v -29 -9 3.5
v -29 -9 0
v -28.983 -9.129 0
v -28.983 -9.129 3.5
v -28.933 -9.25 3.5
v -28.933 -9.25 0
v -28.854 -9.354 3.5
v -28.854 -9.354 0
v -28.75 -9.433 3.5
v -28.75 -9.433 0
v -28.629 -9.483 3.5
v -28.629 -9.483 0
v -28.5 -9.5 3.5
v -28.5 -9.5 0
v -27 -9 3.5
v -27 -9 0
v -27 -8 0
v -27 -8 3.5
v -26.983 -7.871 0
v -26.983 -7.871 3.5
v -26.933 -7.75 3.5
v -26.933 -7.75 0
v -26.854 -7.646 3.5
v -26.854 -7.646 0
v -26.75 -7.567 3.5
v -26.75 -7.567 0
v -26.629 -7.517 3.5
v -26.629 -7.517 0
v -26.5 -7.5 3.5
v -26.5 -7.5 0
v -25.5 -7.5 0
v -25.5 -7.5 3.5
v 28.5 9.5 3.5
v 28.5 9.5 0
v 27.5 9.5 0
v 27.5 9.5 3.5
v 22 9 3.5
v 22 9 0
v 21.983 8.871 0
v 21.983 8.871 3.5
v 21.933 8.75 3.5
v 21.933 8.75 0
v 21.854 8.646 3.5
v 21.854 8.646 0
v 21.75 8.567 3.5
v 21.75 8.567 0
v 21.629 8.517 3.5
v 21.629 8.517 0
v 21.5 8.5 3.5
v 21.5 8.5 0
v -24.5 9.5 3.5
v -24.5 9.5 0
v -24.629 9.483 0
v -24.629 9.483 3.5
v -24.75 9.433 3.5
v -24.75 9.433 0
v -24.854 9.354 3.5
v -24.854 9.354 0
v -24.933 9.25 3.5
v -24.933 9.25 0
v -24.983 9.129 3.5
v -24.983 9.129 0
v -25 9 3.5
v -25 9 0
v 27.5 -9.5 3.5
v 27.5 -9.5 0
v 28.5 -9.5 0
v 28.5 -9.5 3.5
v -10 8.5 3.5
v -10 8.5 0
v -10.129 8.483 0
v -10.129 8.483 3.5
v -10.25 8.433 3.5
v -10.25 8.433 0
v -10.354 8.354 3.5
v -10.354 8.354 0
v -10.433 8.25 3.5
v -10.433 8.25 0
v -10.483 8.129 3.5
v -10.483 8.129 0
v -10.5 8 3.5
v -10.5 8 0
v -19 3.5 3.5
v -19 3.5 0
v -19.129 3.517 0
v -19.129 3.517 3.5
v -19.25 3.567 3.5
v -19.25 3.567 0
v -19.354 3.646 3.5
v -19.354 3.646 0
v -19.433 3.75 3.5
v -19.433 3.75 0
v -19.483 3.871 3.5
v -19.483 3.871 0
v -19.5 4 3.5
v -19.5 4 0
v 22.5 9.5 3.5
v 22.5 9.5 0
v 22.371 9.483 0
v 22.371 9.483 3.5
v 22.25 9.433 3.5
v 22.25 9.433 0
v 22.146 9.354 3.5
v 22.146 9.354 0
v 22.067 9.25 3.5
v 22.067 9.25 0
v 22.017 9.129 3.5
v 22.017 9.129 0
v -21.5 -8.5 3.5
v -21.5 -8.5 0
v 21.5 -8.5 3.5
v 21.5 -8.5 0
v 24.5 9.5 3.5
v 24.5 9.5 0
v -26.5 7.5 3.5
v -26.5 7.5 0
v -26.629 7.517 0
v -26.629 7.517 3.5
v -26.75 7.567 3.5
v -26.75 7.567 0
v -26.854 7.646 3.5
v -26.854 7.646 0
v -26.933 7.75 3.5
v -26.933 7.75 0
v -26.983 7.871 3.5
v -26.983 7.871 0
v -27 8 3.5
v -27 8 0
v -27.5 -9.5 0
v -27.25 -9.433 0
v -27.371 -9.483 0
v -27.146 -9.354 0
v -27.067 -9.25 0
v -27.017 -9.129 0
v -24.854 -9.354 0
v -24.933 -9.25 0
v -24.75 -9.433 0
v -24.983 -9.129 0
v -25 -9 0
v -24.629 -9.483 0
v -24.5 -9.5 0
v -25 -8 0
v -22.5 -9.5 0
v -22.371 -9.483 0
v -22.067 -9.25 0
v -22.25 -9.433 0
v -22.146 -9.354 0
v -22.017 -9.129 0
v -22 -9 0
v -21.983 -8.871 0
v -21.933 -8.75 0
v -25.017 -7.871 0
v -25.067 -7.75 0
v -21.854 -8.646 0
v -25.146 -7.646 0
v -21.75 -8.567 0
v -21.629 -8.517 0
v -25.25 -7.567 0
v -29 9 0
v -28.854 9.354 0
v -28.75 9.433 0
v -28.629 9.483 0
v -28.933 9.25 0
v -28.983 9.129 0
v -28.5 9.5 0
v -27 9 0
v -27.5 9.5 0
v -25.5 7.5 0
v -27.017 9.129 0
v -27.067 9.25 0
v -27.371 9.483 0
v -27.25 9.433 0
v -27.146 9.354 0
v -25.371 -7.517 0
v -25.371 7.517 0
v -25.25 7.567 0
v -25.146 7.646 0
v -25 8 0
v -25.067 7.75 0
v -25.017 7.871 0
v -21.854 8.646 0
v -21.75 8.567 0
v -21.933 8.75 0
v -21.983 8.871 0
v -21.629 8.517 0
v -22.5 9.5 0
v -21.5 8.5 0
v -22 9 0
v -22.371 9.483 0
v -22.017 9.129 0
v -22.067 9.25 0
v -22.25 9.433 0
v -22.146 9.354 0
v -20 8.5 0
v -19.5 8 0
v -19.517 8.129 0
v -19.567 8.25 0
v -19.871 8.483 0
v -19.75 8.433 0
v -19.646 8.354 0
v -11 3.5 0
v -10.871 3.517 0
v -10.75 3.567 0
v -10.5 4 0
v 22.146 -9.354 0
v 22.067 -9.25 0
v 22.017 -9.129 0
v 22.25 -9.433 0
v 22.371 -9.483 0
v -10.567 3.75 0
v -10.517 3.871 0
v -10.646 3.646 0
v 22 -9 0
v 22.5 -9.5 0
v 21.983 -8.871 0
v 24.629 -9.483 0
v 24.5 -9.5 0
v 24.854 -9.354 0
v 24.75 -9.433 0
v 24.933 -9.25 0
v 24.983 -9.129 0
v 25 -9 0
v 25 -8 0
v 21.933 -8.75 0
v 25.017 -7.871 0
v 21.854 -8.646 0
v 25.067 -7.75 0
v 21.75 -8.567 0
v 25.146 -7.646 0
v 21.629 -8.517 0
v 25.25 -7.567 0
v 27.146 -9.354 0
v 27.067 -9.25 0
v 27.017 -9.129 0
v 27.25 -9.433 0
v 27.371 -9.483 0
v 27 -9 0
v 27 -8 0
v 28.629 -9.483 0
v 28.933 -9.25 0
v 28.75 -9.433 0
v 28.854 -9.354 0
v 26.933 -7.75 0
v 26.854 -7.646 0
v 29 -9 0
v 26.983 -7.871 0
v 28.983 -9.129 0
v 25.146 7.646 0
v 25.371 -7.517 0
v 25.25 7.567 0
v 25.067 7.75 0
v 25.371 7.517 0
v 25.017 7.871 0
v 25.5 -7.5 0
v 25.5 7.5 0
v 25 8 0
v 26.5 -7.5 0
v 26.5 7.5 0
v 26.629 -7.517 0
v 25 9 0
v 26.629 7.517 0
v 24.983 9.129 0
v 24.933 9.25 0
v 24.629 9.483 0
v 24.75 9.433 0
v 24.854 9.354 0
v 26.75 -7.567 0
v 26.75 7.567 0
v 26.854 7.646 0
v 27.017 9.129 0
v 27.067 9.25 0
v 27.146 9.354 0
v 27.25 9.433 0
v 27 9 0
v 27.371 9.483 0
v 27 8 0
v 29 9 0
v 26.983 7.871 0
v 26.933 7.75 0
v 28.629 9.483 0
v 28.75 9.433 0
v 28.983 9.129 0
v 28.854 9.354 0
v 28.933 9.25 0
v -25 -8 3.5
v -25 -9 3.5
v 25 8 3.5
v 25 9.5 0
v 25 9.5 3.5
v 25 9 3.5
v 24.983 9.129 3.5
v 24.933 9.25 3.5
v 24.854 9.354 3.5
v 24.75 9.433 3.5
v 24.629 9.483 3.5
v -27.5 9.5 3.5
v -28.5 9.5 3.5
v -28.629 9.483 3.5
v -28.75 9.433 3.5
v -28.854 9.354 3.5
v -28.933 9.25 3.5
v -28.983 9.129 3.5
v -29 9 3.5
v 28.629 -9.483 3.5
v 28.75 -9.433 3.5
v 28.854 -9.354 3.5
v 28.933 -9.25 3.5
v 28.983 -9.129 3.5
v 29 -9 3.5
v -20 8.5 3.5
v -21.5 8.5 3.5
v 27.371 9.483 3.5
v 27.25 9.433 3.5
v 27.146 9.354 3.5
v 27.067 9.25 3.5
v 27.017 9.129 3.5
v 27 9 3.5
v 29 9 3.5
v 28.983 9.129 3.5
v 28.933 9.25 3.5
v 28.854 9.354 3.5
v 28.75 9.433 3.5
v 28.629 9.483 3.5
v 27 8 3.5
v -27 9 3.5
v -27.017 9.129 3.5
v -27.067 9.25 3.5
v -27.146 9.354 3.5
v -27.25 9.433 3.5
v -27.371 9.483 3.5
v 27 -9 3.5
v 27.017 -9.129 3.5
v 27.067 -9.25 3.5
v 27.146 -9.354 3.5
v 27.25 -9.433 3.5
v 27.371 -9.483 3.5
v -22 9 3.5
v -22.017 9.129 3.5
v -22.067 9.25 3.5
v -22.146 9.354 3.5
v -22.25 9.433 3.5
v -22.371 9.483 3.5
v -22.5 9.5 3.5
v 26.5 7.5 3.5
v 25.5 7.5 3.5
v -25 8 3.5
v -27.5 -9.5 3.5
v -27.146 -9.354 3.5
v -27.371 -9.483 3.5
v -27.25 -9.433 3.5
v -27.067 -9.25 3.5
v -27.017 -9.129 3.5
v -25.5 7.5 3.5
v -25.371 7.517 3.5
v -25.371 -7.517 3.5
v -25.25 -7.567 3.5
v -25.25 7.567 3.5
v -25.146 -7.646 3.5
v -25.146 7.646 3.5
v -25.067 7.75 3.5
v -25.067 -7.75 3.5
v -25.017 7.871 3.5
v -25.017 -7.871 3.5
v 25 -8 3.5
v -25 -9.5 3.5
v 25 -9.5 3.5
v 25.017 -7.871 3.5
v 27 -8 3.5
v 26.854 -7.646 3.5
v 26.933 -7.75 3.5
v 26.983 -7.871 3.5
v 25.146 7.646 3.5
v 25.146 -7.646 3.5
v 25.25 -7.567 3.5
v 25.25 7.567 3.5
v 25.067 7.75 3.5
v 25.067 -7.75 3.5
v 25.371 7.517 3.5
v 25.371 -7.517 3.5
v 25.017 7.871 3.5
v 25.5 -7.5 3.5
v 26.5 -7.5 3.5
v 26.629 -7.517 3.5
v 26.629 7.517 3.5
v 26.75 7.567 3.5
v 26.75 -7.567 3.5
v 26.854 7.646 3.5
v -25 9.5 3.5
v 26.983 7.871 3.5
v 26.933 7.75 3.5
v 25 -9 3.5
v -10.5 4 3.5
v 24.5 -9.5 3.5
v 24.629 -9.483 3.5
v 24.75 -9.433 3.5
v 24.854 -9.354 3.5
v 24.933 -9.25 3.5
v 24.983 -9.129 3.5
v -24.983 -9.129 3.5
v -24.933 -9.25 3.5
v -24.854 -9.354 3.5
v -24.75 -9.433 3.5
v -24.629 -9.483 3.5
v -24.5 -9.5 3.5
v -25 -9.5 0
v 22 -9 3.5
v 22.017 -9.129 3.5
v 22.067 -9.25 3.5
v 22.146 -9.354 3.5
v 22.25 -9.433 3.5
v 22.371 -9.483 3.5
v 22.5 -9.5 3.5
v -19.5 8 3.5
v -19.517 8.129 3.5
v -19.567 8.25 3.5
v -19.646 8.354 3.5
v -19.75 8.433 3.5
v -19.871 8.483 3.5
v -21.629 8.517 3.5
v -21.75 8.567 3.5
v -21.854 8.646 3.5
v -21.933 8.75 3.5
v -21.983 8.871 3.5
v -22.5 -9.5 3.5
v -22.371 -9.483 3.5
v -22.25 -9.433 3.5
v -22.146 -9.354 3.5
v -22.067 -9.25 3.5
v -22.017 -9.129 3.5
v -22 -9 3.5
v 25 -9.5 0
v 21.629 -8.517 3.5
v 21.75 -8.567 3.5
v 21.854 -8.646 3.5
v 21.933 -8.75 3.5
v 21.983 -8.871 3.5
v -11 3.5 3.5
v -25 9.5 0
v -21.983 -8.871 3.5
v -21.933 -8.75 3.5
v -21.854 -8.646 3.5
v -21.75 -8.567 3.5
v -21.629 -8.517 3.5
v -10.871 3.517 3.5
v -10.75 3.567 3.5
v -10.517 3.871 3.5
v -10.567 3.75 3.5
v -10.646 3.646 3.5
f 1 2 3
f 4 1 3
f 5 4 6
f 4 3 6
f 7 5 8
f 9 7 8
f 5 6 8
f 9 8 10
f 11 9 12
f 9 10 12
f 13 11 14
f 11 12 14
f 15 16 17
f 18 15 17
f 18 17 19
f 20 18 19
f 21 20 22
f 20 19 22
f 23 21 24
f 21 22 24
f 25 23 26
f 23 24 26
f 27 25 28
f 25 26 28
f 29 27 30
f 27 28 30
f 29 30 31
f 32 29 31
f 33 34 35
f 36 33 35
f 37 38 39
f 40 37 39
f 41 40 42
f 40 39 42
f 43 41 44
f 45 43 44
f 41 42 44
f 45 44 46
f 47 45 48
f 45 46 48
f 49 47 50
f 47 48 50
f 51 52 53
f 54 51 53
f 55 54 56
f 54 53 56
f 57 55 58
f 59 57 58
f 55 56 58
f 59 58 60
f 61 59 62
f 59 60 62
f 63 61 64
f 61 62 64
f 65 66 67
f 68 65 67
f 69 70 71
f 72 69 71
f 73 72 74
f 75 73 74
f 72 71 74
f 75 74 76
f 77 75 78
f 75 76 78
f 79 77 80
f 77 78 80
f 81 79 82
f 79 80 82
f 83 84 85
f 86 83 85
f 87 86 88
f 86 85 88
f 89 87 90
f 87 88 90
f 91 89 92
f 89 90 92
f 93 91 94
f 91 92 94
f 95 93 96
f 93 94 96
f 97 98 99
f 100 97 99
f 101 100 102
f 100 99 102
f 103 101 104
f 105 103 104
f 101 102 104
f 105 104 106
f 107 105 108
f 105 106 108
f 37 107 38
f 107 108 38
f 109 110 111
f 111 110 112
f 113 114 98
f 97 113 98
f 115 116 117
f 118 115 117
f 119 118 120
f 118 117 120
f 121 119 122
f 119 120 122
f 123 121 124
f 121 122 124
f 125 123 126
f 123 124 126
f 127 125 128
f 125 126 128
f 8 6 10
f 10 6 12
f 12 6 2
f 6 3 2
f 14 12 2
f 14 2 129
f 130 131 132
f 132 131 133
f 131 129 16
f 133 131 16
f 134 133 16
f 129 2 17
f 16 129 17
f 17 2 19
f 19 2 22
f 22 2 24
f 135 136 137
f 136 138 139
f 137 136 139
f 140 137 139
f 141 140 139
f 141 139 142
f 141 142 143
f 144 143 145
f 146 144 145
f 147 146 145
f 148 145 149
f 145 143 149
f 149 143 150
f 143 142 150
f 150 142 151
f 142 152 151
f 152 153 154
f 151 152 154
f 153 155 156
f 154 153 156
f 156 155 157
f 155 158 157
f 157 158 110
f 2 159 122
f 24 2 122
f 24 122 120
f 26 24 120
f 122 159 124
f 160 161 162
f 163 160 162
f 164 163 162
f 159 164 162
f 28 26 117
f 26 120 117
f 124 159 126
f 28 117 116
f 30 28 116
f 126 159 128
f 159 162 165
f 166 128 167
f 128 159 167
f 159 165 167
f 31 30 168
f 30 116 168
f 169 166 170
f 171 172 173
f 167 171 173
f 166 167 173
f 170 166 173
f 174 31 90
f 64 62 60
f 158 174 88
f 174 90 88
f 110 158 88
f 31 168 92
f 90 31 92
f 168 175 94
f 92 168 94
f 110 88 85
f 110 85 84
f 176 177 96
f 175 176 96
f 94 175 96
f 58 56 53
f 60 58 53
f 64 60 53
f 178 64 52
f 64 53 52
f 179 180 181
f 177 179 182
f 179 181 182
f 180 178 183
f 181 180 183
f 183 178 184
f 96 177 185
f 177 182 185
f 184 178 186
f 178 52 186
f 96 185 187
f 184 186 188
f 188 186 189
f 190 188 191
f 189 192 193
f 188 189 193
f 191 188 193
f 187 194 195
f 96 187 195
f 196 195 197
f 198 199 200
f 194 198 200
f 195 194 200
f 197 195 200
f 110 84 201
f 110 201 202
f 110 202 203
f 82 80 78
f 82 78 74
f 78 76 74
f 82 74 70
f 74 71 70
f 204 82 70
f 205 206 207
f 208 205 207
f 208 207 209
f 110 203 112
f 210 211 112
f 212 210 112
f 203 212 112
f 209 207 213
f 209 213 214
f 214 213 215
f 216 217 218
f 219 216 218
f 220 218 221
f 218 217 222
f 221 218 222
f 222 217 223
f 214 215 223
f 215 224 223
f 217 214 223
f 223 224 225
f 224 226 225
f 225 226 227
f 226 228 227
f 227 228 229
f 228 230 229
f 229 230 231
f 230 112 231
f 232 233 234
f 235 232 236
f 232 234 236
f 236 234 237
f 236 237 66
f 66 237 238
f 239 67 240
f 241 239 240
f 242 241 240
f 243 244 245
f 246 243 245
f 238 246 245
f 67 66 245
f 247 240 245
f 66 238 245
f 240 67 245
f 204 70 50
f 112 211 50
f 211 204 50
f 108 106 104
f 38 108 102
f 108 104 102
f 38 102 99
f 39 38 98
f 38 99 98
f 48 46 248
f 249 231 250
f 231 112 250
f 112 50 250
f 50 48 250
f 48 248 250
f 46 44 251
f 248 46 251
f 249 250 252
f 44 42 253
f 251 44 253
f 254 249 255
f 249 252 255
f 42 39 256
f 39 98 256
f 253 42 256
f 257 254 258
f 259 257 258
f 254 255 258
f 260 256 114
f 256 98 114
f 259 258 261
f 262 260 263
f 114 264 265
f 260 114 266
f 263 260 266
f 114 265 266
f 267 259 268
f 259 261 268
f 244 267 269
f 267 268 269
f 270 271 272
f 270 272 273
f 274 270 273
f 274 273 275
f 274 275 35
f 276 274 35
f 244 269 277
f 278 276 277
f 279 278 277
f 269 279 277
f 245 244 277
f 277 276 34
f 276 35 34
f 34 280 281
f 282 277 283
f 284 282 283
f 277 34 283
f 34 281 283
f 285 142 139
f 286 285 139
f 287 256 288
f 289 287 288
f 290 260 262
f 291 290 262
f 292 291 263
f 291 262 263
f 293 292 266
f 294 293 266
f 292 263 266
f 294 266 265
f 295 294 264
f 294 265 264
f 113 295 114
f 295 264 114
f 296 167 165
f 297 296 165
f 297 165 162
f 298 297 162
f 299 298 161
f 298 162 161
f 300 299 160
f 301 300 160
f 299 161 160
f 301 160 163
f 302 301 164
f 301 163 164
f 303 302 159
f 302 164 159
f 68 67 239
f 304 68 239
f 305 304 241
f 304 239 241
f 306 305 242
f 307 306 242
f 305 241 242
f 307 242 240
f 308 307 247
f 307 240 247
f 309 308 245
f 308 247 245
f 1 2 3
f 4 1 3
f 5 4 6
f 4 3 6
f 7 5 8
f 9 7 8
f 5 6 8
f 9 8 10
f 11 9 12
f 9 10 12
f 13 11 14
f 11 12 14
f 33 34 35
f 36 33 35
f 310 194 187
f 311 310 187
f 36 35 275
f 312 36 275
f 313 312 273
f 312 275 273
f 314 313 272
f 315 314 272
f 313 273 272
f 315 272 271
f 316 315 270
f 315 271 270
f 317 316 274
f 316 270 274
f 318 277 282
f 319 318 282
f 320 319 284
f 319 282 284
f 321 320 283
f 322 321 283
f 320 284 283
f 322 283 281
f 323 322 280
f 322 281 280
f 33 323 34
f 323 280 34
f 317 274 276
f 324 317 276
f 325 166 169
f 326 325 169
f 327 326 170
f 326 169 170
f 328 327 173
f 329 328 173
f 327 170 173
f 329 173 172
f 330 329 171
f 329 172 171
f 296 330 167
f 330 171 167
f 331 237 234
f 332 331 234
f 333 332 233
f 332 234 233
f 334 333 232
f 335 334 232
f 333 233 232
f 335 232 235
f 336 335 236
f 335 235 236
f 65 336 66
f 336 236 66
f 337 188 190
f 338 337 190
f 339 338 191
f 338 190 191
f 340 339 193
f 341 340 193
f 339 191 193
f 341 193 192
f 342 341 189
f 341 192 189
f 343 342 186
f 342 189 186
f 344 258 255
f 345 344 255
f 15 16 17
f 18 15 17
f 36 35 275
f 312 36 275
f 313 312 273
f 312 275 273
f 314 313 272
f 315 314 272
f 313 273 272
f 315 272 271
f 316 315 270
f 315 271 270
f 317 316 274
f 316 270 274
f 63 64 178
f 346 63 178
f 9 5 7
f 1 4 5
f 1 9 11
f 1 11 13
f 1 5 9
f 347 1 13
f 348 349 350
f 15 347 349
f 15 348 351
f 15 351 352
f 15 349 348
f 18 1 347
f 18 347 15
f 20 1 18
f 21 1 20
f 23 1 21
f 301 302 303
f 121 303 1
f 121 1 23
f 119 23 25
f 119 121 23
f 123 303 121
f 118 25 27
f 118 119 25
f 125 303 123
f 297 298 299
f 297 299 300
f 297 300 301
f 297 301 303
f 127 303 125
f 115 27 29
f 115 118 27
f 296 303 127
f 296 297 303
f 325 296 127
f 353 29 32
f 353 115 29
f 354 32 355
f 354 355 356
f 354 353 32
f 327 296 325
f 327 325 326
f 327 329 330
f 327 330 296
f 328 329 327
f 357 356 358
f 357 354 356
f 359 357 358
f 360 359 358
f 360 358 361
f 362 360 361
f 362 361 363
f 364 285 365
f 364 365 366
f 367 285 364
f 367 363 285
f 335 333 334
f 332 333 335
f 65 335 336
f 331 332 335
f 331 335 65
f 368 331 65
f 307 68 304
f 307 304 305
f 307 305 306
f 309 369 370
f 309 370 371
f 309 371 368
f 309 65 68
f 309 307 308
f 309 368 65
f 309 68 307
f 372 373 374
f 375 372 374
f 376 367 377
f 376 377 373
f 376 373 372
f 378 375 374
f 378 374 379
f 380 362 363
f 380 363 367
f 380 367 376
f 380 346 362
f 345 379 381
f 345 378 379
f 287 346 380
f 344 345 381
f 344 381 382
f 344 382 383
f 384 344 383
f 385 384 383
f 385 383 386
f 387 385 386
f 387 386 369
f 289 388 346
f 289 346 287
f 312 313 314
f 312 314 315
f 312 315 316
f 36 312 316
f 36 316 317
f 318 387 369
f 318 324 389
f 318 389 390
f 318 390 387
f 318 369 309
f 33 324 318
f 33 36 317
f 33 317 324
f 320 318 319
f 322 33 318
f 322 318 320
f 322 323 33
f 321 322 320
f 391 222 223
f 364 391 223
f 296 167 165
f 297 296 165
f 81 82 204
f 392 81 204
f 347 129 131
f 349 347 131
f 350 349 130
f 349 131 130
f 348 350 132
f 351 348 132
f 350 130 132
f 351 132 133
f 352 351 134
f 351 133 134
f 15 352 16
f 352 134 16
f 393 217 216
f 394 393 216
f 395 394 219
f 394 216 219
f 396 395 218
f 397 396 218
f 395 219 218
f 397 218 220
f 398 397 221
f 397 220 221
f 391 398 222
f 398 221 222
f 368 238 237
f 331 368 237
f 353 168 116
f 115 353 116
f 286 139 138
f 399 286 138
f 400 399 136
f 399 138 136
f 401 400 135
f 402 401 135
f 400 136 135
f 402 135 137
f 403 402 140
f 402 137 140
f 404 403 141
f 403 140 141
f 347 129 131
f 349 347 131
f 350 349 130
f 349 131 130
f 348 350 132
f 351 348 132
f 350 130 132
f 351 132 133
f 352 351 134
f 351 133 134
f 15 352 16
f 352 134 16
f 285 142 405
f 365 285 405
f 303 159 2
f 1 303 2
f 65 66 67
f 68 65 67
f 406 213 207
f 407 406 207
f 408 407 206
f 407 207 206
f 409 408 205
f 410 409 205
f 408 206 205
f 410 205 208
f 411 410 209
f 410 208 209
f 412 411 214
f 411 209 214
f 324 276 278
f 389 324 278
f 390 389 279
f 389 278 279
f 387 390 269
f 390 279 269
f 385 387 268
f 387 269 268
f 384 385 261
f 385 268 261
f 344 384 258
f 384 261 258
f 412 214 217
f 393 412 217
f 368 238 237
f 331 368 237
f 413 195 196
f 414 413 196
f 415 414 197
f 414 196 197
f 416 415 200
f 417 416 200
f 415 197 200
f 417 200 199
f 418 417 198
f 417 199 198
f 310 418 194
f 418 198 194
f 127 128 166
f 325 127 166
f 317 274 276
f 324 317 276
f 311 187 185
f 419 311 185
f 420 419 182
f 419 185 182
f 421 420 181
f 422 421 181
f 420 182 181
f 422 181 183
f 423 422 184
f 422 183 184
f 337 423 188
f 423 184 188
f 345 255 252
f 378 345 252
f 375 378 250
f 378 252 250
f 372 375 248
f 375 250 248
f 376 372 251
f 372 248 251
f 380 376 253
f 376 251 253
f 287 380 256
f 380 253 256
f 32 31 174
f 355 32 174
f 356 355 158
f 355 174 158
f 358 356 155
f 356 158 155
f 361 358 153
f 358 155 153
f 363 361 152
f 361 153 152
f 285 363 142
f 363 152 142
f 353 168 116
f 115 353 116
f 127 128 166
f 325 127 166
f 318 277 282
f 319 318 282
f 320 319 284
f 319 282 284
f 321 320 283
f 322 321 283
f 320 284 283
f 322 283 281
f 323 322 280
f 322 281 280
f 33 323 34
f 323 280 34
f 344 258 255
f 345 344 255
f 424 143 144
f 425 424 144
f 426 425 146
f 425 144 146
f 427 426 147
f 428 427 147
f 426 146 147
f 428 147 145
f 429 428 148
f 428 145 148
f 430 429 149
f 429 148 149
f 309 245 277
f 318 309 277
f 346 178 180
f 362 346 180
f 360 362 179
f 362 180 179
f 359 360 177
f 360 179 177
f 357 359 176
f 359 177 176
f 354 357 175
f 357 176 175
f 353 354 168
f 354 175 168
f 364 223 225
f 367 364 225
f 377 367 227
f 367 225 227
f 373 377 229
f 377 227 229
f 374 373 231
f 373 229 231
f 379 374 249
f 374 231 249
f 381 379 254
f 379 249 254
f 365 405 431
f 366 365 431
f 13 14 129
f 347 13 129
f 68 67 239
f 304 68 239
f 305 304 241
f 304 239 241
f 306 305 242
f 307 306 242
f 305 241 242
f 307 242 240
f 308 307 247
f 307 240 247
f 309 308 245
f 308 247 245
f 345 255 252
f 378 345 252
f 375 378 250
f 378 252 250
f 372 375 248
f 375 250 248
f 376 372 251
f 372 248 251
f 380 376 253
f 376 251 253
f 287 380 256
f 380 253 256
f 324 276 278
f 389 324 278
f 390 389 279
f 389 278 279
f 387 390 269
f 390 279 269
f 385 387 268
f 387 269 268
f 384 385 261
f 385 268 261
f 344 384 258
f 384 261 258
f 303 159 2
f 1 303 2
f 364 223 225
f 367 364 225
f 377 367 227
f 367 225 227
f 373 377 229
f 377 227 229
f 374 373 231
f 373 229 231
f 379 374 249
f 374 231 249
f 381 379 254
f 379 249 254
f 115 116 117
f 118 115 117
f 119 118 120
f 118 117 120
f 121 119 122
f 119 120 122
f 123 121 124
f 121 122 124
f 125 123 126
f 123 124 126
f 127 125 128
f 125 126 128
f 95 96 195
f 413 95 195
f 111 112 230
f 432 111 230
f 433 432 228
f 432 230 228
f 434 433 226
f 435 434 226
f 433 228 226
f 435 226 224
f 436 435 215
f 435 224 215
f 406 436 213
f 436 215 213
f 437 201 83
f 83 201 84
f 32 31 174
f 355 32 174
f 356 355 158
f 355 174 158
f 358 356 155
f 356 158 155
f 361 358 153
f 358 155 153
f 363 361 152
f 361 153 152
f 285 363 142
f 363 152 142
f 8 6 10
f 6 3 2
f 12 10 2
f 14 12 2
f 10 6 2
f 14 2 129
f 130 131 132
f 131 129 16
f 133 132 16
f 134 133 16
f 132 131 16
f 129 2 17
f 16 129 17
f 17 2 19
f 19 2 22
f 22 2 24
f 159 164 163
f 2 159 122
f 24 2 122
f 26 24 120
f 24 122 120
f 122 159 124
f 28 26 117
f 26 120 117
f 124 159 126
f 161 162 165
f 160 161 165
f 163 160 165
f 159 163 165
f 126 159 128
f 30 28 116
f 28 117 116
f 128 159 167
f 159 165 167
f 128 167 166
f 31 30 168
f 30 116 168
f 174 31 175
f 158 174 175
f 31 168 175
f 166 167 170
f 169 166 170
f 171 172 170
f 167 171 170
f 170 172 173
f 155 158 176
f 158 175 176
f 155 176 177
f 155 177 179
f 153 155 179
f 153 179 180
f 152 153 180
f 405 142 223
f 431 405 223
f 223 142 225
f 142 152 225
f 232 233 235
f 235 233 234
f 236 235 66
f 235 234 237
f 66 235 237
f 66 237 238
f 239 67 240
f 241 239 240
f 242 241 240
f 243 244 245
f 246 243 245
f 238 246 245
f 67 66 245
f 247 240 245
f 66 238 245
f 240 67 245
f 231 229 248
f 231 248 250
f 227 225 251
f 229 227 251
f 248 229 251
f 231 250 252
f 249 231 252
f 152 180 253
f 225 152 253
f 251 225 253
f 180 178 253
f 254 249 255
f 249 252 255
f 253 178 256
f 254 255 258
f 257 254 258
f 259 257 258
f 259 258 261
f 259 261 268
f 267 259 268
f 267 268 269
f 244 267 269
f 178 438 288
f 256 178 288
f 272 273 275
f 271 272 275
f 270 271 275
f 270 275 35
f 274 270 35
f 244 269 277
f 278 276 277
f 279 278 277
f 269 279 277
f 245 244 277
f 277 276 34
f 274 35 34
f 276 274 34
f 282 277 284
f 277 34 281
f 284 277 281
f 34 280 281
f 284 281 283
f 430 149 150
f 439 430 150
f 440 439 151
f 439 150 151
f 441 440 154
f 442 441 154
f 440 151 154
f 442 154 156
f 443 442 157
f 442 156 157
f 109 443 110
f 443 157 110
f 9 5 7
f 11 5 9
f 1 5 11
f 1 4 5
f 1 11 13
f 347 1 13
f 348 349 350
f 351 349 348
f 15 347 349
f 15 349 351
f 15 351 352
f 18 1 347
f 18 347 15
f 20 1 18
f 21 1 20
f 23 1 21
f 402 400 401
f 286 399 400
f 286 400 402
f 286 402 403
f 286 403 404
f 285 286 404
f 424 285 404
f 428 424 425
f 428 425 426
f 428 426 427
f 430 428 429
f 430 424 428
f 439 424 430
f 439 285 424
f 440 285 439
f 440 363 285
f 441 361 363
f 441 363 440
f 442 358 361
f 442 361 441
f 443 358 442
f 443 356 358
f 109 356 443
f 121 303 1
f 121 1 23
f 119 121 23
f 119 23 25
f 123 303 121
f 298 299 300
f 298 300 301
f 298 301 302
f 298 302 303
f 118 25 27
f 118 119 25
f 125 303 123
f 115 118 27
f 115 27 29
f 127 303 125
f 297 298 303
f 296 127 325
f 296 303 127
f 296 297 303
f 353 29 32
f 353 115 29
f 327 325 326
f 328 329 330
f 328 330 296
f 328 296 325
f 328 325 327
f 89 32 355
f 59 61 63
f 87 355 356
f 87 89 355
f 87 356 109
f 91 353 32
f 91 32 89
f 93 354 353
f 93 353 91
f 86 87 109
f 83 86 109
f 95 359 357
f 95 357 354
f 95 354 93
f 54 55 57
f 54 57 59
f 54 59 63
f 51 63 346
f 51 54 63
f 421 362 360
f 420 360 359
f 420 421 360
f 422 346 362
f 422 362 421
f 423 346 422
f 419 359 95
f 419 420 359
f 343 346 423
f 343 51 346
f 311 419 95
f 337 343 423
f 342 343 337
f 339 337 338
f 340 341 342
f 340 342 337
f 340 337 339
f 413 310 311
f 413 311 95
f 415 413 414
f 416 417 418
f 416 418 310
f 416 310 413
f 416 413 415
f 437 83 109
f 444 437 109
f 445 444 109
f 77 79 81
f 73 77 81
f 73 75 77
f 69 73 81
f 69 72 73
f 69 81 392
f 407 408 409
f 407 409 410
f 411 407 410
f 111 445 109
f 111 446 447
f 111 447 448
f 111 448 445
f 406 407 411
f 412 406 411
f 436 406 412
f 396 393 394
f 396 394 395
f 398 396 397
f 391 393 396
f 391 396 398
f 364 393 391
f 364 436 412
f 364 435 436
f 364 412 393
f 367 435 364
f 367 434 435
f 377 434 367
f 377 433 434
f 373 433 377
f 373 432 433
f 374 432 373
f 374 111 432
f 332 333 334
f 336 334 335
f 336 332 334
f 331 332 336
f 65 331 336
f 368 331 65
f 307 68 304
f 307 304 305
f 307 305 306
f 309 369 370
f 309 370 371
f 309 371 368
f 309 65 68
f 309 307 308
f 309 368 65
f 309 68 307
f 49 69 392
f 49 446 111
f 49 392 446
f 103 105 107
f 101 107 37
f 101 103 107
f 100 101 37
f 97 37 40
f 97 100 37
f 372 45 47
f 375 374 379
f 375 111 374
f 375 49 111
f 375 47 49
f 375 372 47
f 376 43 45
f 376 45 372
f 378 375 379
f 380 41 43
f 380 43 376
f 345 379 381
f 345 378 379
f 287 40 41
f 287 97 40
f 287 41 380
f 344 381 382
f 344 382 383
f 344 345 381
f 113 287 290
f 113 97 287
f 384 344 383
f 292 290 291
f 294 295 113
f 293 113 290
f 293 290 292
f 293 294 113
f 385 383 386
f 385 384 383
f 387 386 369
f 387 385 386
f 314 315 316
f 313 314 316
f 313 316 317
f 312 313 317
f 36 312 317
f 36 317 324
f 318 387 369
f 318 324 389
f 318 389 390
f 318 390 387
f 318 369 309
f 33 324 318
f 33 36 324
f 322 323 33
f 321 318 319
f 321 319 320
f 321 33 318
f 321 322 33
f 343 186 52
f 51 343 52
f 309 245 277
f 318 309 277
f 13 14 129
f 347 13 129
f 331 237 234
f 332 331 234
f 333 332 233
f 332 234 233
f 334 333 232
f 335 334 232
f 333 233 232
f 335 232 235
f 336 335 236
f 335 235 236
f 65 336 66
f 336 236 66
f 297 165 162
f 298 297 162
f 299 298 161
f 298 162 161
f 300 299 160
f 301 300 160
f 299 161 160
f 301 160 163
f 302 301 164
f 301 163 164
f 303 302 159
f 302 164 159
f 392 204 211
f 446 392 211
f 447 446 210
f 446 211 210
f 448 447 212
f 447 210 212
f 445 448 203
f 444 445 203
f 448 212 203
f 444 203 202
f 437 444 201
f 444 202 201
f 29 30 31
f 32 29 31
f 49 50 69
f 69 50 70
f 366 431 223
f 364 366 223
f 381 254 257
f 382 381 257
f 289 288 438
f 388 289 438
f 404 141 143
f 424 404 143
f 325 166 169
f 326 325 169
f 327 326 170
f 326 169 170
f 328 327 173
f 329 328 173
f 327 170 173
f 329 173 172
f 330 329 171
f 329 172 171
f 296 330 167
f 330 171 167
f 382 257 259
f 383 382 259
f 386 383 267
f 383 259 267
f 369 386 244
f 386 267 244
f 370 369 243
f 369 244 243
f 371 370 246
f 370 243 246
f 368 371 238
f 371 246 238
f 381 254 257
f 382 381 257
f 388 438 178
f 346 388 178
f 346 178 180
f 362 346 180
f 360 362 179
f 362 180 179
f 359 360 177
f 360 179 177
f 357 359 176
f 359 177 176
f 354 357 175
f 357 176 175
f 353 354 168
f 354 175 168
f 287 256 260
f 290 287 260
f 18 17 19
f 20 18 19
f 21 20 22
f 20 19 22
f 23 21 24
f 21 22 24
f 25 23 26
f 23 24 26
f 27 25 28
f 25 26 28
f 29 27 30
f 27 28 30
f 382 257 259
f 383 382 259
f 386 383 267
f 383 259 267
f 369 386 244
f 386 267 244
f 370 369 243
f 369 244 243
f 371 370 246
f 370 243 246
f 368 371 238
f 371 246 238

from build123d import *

# Parameters (mm, degrees)
F2_DEPTH = 3.5
F3_DEPTH = 3.5


with BuildPart() as f2:
    # F1 (on Top) → F2 (new body)
    with BuildSketch(Plane.XY):
        with BuildLine():
            Line((-22.5, 9.5), (-24.5, 9.5))
            ThreePointArc((-24.5, 9.5), (-24.853553, 9.353553), (-25, 9))
            Line((-25, 9), (-25, 8))
            ThreePointArc((-25, 8), (-25.146447, 7.646447), (-25.5, 7.5))
            Line((-25.5, 7.5), (-26.5, 7.5))
            ThreePointArc((-26.5, 7.5), (-26.853553, 7.646447), (-27, 8))
            Line((-27, 8), (-27, 9))
            ThreePointArc((-27, 9), (-27.146447, 9.353553), (-27.5, 9.5))
            Line((-27.5, 9.5), (-28.5, 9.5))
            ThreePointArc((-28.5, 9.5), (-28.853553, 9.353553), (-29, 9))
            Line((-29, 9), (-29, 0))
            Line((-29, 0), (-29, -9))
            ThreePointArc((-29, -9), (-28.853553, -9.353553), (-28.5, -9.5))
            Line((-28.5, -9.5), (-27.5, -9.5))
            ThreePointArc((-27.5, -9.5), (-27.146447, -9.353553), (-27, -9))
            Line((-27, -9), (-27, -8))
            ThreePointArc((-27, -8), (-26.853553, -7.646447), (-26.5, -7.5))
            Line((-26.5, -7.5), (-25.5, -7.5))
            ThreePointArc((-25.5, -7.5), (-25.146447, -7.646447), (-25, -8))
            Line((-25, -8), (-25, -9))
            ThreePointArc((-25, -9), (-24.853553, -9.353553), (-24.5, -9.5))
            Line((-24.5, -9.5), (-22.5, -9.5))
            ThreePointArc((-22.5, -9.5), (-22.146447, -9.353553), (-22, -9))
            ThreePointArc((-22, -9), (-21.853553, -8.646447), (-21.5, -8.5))
            Line((-21.5, -8.5), (0, -8.5))
            Line((0, -8.5), (21.5, -8.5))
            ThreePointArc((21.5, -8.5), (21.853553, -8.646447), (22, -9))
            ThreePointArc((22, -9), (22.146447, -9.353553), (22.5, -9.5))
            Line((22.5, -9.5), (24.5, -9.5))
            ThreePointArc((24.5, -9.5), (24.853553, -9.353553), (25, -9))
            Line((25, -9), (25, -8))
            ThreePointArc((25, -8), (25.146447, -7.646447), (25.5, -7.5))
            Line((25.5, -7.5), (26.5, -7.5))
            ThreePointArc((26.5, -7.5), (26.853553, -7.646447), (27, -8))
            Line((27, -8), (27, -9))
            ThreePointArc((27, -9), (27.146447, -9.353553), (27.5, -9.5))
            Line((27.5, -9.5), (28.5, -9.5))
            ThreePointArc((28.5, -9.5), (28.853553, -9.353553), (29, -9))
            Line((29, -9), (29, 0))
            Line((29, 0), (29, 9))
            ThreePointArc((29, 9), (28.853553, 9.353553), (28.5, 9.5))
            Line((28.5, 9.5), (27.5, 9.5))
            ThreePointArc((27.5, 9.5), (27.146447, 9.353553), (27, 9))
            Line((27, 9), (27, 8))
            ThreePointArc((27, 8), (26.853553, 7.646447), (26.5, 7.5))
            Line((26.5, 7.5), (25.5, 7.5))
            ThreePointArc((25.5, 7.5), (25.146447, 7.646447), (25, 8))
            Line((25, 8), (25, 9))
            ThreePointArc((25, 9), (24.853553, 9.353553), (24.5, 9.5))
            Line((24.5, 9.5), (22.5, 9.5))
            ThreePointArc((22.5, 9.5), (22.146447, 9.353553), (22, 9))
            ThreePointArc((22, 9), (21.853553, 8.646447), (21.5, 8.5))
            Line((21.5, 8.5), (0, 8.5))
            Line((0, 8.5), (-10, 8.5))
            ThreePointArc((-10, 8.5), (-10.353553, 8.353553), (-10.5, 8))
            Line((-10.5, 8), (-10.5, 4))
            ThreePointArc((-10.5, 4), (-10.646447, 3.646447), (-11, 3.5))
            Line((-11, 3.5), (-19, 3.5))
            ThreePointArc((-19, 3.5), (-19.353553, 3.646447), (-19.5, 4))
            Line((-19.5, 4), (-19.5, 8))
            ThreePointArc((-19.5, 8), (-19.646447, 8.353553), (-20, 8.5))
            Line((-20, 8.5), (-21.5, 8.5))
            ThreePointArc((-21.5, 8.5), (-21.853553, 8.646447), (-22, 9))
            ThreePointArc((-22, 9), (-22.146447, 9.353553), (-22.5, 9.5))
        make_face()
    extrude(amount=F2_DEPTH)


with BuildPart() as f3:
    # F0 (on Top) → F3 (new body)
    with BuildSketch(Plane.XY):
        with BuildLine():
            Line((-27.5, 9.5), (-28.5, 9.5))
            ThreePointArc((-28.5, 9.5), (-28.853553, 9.353553), (-29, 9))
            Line((-29, 9), (-29, 0))
            Line((-29, 0), (-29, -9))
            ThreePointArc((-29, -9), (-28.853553, -9.353553), (-28.5, -9.5))
            Line((-28.5, -9.5), (-27.5, -9.5))
            ThreePointArc((-27.5, -9.5), (-27.146447, -9.353553), (-27, -9))
            Line((-27, -9), (-27, -8))
            ThreePointArc((-27, -8), (-26.853553, -7.646447), (-26.5, -7.5))
            Line((-26.5, -7.5), (-25.5, -7.5))
            ThreePointArc((-25.5, -7.5), (-25.146447, -7.646447), (-25, -8))
            Line((-25, -8), (-25, -9.5))
            Line((-25, -9.5), (0, -9.5))
            Line((0, -9.5), (25, -9.5))
            Line((25, -9.5), (25, -8))
            ThreePointArc((25, -8), (25.146447, -7.646447), (25.5, -7.5))
            Line((25.5, -7.5), (26.5, -7.5))
            ThreePointArc((26.5, -7.5), (26.853553, -7.646447), (27, -8))
            Line((27, -8), (27, -9))
            ThreePointArc((27, -9), (27.146447, -9.353553), (27.5, -9.5))
            Line((27.5, -9.5), (28.5, -9.5))
            ThreePointArc((28.5, -9.5), (28.853553, -9.353553), (29, -9))
            Line((29, -9), (29, 0))
            Line((29, 0), (29, 9))
            ThreePointArc((29, 9), (28.853553, 9.353553), (28.5, 9.5))
            Line((28.5, 9.5), (27.5, 9.5))
            ThreePointArc((27.5, 9.5), (27.146447, 9.353553), (27, 9))
            Line((27, 9), (27, 8))
            ThreePointArc((27, 8), (26.853553, 7.646447), (26.5, 7.5))
            Line((26.5, 7.5), (25.5, 7.5))
            ThreePointArc((25.5, 7.5), (25.146447, 7.646447), (25, 8))
            Line((25, 8), (25, 9.5))
            Line((25, 9.5), (0, 9.5))
            Line((0, 9.5), (-25, 9.5))
            Line((-25, 9.5), (-25, 8))
            ThreePointArc((-25, 8), (-25.146447, 7.646447), (-25.5, 7.5))
            Line((-25.5, 7.5), (-26.5, 7.5))
            ThreePointArc((-26.5, 7.5), (-26.853553, 7.646447), (-27, 8))
            Line((-27, 8), (-27, 9))
            ThreePointArc((-27, 9), (-27.146447, 9.353553), (-27.5, 9.5))
        make_face()
    extrude(amount=F3_DEPTH)


solid = Compound([f2.part, f3.part])
